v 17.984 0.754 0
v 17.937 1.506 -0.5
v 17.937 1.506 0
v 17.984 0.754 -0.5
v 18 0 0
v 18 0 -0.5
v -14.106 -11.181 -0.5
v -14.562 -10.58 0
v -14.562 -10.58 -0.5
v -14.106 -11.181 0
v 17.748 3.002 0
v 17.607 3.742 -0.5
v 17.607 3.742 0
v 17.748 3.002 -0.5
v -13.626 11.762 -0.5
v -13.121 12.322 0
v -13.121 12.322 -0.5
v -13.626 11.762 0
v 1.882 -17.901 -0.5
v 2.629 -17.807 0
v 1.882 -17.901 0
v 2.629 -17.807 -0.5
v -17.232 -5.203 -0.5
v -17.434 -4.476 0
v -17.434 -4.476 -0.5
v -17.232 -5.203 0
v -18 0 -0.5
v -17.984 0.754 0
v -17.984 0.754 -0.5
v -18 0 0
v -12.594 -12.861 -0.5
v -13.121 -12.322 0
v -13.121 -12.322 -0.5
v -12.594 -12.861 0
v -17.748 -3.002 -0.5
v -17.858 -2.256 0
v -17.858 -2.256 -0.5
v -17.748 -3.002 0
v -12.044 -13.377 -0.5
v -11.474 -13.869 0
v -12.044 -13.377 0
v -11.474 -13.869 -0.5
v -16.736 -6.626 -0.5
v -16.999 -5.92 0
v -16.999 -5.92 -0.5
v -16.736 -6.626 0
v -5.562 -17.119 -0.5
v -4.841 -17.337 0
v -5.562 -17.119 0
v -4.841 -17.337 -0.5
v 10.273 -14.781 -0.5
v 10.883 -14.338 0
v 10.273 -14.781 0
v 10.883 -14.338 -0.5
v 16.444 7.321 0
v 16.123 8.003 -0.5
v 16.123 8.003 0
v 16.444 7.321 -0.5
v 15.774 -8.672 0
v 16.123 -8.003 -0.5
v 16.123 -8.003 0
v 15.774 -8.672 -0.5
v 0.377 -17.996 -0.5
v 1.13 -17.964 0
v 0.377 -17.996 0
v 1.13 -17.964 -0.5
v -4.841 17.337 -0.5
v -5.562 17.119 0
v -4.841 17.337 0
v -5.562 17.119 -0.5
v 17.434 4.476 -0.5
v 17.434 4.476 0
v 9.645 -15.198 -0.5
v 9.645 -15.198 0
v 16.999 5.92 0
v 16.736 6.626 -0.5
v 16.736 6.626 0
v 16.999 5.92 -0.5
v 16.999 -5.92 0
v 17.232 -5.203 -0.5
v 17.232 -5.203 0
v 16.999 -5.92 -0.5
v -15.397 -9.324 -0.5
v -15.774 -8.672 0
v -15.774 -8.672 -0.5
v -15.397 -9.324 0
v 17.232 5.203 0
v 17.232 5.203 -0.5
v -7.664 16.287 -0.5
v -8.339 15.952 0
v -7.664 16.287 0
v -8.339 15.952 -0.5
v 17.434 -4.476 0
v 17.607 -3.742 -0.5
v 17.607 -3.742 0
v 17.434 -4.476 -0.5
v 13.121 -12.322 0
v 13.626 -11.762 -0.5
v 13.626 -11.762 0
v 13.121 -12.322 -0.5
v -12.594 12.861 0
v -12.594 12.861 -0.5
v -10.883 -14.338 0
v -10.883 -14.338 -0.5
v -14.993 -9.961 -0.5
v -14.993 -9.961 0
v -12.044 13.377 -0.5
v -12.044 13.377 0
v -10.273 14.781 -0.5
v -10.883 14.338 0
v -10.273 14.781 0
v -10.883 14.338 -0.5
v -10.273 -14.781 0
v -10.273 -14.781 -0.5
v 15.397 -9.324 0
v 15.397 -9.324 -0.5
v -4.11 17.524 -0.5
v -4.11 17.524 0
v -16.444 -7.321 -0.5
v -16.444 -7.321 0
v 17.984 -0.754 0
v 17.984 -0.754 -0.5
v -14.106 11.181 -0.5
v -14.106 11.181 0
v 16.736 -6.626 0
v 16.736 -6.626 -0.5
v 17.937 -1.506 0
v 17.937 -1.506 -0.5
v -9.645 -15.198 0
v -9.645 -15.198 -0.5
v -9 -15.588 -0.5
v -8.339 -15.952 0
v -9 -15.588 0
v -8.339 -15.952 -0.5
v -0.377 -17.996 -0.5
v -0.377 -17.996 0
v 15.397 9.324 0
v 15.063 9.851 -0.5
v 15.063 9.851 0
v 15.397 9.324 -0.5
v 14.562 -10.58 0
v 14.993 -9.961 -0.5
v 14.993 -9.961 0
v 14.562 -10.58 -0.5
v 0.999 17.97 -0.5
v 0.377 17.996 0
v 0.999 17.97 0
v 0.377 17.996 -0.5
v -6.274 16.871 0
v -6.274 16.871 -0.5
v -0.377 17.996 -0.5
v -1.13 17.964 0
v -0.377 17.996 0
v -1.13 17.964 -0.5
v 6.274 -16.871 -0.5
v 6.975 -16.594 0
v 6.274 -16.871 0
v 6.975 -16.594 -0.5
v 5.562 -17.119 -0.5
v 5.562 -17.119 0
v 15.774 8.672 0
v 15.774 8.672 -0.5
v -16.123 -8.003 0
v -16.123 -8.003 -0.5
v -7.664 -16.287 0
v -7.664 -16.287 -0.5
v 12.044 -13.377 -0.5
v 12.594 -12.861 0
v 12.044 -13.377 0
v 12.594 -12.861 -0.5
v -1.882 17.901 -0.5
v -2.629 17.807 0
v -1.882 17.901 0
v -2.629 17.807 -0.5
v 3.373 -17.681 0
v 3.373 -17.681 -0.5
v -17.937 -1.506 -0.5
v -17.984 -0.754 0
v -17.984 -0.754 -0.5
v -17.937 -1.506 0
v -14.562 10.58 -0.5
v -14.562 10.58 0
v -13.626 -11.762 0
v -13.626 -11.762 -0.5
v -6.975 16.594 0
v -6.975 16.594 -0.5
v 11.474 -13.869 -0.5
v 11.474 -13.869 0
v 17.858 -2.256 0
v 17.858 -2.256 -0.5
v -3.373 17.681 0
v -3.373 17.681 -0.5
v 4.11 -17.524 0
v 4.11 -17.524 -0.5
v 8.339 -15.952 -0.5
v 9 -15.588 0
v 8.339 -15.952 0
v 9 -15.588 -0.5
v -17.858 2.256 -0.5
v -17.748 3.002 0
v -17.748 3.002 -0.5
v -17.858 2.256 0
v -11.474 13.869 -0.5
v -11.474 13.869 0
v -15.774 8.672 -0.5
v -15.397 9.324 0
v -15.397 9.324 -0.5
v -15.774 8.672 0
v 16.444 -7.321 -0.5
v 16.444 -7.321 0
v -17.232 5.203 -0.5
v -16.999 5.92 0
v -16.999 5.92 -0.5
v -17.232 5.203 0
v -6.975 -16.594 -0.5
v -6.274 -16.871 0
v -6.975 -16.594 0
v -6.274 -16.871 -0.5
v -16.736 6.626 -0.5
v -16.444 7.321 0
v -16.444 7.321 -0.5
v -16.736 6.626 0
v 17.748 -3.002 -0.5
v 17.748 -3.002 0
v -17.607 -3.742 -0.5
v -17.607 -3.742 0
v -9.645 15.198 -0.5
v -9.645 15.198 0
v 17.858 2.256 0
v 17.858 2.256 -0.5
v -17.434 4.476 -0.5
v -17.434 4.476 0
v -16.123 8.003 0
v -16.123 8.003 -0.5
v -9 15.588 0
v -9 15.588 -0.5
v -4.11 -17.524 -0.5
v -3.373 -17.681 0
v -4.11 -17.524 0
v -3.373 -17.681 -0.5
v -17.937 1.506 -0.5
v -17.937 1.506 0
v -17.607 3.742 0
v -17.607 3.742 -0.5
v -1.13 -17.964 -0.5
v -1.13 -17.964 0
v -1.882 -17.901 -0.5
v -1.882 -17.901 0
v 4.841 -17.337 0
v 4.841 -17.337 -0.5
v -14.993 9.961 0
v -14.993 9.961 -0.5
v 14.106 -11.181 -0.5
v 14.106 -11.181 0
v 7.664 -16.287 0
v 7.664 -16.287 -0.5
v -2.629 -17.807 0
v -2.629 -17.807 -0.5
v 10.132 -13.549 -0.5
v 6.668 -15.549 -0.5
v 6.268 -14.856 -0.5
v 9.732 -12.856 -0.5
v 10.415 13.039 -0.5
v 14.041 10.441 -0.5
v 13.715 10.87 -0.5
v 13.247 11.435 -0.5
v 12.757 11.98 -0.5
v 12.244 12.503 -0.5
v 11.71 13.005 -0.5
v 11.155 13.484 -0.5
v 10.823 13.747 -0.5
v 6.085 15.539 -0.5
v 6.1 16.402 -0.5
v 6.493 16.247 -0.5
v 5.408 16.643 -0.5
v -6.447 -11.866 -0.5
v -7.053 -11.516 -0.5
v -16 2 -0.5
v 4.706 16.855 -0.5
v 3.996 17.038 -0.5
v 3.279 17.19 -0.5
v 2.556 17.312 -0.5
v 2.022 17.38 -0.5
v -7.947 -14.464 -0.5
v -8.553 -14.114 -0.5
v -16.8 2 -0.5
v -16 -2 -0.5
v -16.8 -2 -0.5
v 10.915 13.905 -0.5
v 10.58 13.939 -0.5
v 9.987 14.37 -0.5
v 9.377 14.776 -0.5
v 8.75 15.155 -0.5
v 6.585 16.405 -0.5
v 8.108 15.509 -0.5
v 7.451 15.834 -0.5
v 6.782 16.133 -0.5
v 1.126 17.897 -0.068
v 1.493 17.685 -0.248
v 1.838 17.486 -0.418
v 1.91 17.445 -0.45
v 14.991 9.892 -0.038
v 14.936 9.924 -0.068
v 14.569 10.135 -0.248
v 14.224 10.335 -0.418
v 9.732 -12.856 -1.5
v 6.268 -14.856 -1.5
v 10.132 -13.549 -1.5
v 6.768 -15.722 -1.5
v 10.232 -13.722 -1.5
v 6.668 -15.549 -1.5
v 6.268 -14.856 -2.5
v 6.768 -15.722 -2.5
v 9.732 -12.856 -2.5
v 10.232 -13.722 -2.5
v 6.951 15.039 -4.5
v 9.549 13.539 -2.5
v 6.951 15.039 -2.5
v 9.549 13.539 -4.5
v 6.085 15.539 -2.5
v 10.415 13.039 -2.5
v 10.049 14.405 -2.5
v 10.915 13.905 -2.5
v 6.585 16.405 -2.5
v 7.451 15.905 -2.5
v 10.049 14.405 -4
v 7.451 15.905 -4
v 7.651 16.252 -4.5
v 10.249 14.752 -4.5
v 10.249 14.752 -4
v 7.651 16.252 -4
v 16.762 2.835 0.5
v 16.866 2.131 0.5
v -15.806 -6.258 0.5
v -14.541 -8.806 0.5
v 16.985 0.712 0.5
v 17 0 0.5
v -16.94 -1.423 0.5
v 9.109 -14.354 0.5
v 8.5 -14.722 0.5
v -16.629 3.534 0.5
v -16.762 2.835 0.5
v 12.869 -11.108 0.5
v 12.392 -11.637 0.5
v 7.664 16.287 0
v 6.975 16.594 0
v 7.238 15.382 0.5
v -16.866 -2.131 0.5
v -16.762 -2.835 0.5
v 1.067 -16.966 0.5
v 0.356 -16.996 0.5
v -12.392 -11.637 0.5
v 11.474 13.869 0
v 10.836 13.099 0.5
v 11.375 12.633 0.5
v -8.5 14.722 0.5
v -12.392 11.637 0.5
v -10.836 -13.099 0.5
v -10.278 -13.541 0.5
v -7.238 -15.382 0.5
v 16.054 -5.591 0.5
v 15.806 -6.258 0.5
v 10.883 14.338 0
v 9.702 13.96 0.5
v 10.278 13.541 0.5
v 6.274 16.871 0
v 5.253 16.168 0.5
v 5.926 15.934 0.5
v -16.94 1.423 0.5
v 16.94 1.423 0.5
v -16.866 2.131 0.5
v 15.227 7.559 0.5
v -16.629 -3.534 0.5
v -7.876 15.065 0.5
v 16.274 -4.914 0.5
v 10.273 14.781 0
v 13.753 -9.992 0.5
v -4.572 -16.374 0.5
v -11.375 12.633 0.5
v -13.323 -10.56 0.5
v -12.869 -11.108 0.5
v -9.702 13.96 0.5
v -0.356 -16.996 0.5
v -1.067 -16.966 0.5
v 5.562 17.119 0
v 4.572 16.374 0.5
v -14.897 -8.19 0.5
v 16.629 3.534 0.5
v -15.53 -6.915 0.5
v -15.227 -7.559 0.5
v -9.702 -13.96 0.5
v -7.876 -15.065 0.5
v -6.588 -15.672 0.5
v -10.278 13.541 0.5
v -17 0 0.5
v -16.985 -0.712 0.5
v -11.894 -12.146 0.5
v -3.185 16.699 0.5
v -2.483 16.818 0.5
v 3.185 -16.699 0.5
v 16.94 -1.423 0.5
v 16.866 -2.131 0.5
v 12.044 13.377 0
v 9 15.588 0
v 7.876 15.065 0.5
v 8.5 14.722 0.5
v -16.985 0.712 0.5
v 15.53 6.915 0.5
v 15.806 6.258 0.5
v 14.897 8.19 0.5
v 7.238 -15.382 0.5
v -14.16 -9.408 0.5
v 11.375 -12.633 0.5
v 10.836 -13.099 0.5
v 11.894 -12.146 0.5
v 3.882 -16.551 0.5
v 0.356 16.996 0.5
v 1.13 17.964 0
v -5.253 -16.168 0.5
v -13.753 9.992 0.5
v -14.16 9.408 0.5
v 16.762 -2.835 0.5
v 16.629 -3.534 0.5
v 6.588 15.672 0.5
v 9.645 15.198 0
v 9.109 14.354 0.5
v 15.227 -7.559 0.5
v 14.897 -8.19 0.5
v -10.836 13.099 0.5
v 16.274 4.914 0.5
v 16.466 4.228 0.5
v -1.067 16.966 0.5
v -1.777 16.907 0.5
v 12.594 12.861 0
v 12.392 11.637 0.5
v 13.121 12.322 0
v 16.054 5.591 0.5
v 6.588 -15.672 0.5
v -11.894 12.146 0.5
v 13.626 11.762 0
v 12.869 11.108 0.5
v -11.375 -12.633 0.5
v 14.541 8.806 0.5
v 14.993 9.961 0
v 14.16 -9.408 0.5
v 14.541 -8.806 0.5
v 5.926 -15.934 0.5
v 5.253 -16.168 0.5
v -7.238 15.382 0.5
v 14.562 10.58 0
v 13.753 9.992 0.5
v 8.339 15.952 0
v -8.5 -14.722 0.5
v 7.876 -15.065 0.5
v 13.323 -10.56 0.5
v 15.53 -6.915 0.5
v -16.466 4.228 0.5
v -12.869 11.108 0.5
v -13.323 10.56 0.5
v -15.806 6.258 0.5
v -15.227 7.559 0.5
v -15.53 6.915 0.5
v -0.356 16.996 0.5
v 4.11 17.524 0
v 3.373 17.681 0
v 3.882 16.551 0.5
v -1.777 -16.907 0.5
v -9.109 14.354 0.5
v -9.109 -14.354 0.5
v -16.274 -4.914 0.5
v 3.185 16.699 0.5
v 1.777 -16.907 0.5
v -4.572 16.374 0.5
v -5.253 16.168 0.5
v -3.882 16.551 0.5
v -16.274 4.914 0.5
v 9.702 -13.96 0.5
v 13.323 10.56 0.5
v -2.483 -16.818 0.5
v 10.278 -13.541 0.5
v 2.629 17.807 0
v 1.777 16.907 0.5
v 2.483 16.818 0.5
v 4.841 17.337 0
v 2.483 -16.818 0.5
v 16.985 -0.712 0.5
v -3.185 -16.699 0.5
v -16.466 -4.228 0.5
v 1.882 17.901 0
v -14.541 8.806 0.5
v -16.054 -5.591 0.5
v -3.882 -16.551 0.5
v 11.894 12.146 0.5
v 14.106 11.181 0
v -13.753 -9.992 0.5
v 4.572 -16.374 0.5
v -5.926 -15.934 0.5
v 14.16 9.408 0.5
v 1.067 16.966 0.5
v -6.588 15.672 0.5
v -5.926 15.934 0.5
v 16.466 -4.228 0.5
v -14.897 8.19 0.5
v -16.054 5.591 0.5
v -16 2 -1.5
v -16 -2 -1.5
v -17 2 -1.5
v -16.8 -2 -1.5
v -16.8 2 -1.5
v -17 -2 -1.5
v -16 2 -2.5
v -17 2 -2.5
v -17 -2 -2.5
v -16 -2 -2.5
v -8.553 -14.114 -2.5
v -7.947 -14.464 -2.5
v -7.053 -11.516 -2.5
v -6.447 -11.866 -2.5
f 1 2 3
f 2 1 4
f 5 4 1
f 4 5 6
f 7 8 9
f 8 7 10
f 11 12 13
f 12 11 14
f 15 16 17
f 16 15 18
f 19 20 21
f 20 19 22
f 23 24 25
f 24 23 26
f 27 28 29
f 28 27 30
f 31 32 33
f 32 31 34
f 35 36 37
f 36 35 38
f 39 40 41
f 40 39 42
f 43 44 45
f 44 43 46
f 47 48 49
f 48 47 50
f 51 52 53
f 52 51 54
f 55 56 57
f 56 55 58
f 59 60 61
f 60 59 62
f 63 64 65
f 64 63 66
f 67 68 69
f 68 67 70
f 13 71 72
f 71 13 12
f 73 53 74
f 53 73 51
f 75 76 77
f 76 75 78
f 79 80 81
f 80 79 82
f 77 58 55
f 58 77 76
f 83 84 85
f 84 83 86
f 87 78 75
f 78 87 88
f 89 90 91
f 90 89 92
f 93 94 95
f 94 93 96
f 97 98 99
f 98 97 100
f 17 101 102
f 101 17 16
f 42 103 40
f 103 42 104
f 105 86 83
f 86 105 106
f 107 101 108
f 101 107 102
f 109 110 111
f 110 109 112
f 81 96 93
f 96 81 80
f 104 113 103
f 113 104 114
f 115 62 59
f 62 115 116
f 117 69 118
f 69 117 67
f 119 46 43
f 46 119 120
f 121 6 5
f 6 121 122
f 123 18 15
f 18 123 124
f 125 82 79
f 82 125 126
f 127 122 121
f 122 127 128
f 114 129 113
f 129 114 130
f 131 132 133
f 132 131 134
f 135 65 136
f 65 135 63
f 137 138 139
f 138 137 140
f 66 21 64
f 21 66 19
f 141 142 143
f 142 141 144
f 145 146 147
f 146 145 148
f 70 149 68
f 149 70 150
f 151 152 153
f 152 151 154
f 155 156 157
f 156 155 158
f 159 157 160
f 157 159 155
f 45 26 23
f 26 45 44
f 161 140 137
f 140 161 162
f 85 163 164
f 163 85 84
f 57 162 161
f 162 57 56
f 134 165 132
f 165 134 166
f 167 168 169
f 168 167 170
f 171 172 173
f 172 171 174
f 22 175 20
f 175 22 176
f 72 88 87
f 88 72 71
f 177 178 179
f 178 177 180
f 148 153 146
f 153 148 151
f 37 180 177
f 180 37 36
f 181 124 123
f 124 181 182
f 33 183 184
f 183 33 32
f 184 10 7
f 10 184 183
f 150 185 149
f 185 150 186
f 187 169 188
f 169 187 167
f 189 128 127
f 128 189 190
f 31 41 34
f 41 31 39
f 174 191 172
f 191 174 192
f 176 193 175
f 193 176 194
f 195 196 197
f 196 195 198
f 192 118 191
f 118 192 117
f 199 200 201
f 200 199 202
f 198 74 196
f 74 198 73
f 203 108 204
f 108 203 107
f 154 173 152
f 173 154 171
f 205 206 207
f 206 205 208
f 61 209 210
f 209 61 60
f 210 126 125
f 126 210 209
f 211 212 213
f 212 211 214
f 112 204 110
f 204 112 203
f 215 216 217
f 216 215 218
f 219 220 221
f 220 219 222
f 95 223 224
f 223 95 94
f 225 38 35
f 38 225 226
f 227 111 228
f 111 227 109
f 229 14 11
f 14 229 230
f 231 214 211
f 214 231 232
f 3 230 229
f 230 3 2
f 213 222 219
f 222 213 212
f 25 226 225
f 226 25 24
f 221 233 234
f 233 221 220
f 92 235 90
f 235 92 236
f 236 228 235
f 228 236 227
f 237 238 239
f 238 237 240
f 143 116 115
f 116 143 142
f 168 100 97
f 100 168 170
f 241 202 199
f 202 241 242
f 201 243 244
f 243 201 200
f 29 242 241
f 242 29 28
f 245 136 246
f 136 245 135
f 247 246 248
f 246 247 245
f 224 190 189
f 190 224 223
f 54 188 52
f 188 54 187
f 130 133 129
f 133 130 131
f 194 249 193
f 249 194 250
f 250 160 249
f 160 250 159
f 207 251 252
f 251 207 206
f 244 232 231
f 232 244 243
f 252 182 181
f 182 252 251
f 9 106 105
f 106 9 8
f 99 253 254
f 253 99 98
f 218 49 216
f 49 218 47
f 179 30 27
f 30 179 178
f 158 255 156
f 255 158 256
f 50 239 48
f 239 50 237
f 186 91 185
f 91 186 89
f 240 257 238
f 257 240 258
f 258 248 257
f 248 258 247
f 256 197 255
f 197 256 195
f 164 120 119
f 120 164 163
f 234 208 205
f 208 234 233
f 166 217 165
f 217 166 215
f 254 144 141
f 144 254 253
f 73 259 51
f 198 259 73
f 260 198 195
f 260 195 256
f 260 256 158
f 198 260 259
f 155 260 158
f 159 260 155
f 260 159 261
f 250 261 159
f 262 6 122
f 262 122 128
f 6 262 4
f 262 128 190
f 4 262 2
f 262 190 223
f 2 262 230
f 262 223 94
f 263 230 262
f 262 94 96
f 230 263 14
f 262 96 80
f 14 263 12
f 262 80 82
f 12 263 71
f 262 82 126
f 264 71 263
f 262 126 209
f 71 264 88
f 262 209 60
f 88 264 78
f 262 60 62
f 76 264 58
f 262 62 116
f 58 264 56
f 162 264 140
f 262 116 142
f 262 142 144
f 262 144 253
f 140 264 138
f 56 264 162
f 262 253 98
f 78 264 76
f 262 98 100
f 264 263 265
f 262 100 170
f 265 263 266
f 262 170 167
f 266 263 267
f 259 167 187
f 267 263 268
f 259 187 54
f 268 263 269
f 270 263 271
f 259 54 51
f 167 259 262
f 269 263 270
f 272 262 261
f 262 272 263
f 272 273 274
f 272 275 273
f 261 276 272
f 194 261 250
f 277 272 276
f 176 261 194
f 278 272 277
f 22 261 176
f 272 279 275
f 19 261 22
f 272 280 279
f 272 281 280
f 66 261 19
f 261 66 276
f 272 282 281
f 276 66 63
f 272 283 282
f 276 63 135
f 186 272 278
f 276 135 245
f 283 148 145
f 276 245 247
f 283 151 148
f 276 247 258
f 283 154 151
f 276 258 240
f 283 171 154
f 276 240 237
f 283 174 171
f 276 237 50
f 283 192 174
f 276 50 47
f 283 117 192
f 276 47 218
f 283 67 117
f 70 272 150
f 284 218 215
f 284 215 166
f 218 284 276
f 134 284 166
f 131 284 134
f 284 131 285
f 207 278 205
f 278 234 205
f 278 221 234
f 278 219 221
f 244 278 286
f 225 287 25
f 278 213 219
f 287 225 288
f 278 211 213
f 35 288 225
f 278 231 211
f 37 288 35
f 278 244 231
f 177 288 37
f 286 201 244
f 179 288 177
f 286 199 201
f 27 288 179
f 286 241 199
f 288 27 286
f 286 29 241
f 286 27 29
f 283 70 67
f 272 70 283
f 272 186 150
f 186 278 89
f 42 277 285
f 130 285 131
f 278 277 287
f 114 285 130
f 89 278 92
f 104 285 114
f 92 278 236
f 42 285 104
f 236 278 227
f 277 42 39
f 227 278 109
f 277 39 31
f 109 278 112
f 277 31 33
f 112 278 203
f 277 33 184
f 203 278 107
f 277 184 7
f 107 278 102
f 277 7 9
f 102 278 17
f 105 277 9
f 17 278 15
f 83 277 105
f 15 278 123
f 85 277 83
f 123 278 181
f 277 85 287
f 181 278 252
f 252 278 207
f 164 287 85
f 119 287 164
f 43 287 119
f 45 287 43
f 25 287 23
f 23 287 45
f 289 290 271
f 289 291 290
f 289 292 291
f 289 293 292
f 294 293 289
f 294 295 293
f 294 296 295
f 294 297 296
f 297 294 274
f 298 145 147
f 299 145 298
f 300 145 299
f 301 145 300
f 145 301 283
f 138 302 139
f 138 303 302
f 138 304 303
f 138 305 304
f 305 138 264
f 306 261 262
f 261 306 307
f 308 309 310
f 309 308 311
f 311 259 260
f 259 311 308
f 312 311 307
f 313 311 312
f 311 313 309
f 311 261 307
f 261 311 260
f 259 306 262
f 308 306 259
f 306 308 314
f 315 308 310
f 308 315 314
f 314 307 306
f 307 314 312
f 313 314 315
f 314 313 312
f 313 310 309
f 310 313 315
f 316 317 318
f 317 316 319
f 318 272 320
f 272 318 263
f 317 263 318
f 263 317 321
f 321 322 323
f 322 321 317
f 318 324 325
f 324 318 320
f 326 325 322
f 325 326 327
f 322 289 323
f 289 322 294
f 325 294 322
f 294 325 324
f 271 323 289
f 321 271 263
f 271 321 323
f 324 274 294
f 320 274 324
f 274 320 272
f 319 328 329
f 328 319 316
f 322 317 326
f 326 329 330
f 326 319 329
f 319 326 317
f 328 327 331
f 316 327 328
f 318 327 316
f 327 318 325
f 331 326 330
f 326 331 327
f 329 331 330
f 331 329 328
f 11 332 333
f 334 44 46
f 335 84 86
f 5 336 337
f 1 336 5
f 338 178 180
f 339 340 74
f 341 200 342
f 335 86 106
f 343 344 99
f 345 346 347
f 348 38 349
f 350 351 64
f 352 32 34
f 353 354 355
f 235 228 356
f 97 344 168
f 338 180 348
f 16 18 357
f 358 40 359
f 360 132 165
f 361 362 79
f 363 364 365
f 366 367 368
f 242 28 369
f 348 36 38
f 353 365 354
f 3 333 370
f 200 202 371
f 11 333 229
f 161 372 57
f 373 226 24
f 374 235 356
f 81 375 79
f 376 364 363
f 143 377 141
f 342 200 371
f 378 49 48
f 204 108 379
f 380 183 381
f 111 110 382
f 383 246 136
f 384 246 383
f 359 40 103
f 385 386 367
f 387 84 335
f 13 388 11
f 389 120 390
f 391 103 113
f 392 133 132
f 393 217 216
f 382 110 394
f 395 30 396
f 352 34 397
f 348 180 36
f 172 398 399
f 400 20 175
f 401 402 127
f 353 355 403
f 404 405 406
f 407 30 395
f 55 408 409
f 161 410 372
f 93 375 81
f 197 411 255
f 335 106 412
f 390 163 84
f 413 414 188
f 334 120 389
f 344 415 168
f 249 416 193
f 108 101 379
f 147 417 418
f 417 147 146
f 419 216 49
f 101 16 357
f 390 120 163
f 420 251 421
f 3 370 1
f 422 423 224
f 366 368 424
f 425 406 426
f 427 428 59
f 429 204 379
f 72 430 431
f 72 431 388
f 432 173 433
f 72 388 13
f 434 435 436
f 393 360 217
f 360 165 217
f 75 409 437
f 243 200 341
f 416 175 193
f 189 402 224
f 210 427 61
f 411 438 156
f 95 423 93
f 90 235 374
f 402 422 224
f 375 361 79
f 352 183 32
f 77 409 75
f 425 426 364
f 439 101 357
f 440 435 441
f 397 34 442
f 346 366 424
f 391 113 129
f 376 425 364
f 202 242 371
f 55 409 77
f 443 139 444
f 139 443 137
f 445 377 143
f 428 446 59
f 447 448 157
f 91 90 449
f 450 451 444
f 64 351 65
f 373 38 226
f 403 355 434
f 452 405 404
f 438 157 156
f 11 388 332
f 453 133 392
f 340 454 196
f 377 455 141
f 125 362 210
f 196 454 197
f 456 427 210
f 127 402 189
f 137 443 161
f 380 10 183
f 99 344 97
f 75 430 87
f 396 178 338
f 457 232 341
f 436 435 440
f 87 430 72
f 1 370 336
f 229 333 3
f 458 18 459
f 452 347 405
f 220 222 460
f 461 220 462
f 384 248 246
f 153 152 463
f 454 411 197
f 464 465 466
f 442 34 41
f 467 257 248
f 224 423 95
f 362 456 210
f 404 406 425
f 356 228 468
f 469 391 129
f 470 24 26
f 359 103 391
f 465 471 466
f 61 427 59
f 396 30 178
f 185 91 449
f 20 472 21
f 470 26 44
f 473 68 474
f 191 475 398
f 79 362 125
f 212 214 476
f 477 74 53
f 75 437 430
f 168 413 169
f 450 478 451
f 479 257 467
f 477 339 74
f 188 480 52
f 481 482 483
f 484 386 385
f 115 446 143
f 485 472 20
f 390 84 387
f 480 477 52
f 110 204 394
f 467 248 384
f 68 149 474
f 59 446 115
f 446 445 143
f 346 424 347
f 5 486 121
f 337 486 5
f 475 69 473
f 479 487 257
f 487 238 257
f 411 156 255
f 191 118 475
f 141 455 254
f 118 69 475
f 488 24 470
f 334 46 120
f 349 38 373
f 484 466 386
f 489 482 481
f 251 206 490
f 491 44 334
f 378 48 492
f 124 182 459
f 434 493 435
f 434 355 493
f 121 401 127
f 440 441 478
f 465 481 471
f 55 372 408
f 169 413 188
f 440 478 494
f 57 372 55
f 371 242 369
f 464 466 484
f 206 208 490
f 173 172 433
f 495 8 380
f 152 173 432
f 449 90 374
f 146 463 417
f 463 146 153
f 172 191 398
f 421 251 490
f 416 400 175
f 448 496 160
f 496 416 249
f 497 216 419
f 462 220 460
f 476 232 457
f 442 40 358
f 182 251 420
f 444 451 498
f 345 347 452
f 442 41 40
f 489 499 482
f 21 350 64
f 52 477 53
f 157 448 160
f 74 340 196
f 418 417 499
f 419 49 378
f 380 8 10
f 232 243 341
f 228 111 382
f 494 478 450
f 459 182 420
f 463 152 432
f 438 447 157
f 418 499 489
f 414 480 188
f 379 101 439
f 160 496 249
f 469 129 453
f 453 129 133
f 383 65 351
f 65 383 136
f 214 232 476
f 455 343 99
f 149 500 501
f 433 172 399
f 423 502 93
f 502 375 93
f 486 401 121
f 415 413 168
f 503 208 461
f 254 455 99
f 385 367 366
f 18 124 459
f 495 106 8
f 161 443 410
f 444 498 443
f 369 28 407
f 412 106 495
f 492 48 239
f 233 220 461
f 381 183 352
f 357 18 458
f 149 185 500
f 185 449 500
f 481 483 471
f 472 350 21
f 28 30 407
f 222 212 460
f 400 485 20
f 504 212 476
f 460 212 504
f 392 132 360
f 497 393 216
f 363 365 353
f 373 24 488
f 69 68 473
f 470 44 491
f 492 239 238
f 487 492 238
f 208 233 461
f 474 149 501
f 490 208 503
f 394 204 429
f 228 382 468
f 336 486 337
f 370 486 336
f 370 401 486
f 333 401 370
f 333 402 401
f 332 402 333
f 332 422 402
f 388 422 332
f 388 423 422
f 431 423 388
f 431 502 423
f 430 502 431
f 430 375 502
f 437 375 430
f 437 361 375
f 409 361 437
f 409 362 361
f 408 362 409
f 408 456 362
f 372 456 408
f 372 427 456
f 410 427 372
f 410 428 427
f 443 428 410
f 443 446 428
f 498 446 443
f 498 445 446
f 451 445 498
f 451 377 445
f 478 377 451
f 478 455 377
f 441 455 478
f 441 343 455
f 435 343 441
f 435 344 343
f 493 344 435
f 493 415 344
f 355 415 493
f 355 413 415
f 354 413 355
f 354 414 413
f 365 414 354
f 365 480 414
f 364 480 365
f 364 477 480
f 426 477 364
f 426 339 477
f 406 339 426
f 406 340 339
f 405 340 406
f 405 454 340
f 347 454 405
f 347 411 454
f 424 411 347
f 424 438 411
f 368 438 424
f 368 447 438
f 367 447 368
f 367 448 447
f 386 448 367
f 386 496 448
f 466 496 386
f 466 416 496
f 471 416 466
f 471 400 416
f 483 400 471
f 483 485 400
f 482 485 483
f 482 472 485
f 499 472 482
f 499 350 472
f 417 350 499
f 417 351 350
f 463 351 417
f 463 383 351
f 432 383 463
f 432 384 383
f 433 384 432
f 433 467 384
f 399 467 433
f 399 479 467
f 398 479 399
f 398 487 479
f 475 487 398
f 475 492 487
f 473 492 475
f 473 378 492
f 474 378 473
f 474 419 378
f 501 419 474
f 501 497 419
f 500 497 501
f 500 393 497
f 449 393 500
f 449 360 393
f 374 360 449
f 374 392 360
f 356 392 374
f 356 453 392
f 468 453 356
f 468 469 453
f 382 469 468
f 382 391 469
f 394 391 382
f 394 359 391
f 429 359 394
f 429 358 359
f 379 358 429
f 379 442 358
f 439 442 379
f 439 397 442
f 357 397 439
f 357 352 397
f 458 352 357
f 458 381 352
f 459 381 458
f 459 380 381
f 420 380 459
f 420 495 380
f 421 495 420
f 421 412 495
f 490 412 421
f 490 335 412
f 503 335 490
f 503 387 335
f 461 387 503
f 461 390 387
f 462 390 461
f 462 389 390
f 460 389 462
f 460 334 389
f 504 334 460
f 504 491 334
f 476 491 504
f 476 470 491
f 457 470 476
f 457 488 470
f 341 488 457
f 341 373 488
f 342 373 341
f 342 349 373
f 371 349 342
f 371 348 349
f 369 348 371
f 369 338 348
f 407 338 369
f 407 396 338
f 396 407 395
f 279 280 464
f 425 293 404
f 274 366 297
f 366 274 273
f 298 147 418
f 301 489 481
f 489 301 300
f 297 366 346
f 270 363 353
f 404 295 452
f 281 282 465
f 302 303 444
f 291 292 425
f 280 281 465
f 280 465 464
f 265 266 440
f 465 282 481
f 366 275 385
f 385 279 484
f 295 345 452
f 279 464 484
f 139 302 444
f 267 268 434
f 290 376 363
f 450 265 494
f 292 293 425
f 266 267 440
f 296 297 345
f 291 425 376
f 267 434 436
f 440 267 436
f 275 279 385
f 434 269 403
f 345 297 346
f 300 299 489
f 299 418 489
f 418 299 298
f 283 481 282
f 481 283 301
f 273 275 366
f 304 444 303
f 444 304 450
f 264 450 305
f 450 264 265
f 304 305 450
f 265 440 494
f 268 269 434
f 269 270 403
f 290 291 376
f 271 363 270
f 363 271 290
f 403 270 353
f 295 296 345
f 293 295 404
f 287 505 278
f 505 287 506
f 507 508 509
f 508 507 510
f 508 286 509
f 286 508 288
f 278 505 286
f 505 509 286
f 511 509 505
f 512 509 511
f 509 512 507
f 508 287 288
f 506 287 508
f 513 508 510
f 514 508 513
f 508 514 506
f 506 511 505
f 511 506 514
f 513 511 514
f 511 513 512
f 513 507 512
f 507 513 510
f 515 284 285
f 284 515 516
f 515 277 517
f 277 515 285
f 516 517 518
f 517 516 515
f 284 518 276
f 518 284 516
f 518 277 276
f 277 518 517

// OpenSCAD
difference(){
    ear();
    //translate([0,0,-1]) cylinder(h=3,d=25);
}


module ear(){
    
    $fn=150;
    sphere_size=200;
    intersection(){
        cylinder(h=0.5,d1=36,d2=34);
        //translate([0,0,-sphere_size+1])
        //rotate([45,45,0])
        //sphere(sphere_size);
    }
    translate([0,0,-0.5])cylinder(h=0.5,d1=35,d2=36);
    
    difference(){
        translate([0,0,-0.5])cylinder(h=0.5,d1=36,d2=36);
        #translate([20,7,-1])
        rotate([0,0,360/6])cube([50,50,50]);
    }

    translate([-36/2+1.6,0,-1])cube([0.8,4,1], true);
    translate([-36/2+1.5,0,-2])cube([1,4,1], true);

    rotate([0,0,360/3]){
        translate([-36/2+1.6,0,-1])cube([0.8,4,1], true);
        translate([-36/2+1.5,0,-2])cube([1,4,1], true);
    }

    rotate([0,0,360/6]){
        translate([-36/2+3,0,-1.5])cube([3,0.7,2], true);
    }

    rotate([0,0,360/6+180]){
        translate([-36/2+1,0,-1.5])cube([1,5,2], true);
        translate([-36/2+1,0,-3.5])cube([1,3,2], true);
        translate([-36/2+0.7,0,-4.25])cube([1.2,3,0.5], true);
        
    }
}
